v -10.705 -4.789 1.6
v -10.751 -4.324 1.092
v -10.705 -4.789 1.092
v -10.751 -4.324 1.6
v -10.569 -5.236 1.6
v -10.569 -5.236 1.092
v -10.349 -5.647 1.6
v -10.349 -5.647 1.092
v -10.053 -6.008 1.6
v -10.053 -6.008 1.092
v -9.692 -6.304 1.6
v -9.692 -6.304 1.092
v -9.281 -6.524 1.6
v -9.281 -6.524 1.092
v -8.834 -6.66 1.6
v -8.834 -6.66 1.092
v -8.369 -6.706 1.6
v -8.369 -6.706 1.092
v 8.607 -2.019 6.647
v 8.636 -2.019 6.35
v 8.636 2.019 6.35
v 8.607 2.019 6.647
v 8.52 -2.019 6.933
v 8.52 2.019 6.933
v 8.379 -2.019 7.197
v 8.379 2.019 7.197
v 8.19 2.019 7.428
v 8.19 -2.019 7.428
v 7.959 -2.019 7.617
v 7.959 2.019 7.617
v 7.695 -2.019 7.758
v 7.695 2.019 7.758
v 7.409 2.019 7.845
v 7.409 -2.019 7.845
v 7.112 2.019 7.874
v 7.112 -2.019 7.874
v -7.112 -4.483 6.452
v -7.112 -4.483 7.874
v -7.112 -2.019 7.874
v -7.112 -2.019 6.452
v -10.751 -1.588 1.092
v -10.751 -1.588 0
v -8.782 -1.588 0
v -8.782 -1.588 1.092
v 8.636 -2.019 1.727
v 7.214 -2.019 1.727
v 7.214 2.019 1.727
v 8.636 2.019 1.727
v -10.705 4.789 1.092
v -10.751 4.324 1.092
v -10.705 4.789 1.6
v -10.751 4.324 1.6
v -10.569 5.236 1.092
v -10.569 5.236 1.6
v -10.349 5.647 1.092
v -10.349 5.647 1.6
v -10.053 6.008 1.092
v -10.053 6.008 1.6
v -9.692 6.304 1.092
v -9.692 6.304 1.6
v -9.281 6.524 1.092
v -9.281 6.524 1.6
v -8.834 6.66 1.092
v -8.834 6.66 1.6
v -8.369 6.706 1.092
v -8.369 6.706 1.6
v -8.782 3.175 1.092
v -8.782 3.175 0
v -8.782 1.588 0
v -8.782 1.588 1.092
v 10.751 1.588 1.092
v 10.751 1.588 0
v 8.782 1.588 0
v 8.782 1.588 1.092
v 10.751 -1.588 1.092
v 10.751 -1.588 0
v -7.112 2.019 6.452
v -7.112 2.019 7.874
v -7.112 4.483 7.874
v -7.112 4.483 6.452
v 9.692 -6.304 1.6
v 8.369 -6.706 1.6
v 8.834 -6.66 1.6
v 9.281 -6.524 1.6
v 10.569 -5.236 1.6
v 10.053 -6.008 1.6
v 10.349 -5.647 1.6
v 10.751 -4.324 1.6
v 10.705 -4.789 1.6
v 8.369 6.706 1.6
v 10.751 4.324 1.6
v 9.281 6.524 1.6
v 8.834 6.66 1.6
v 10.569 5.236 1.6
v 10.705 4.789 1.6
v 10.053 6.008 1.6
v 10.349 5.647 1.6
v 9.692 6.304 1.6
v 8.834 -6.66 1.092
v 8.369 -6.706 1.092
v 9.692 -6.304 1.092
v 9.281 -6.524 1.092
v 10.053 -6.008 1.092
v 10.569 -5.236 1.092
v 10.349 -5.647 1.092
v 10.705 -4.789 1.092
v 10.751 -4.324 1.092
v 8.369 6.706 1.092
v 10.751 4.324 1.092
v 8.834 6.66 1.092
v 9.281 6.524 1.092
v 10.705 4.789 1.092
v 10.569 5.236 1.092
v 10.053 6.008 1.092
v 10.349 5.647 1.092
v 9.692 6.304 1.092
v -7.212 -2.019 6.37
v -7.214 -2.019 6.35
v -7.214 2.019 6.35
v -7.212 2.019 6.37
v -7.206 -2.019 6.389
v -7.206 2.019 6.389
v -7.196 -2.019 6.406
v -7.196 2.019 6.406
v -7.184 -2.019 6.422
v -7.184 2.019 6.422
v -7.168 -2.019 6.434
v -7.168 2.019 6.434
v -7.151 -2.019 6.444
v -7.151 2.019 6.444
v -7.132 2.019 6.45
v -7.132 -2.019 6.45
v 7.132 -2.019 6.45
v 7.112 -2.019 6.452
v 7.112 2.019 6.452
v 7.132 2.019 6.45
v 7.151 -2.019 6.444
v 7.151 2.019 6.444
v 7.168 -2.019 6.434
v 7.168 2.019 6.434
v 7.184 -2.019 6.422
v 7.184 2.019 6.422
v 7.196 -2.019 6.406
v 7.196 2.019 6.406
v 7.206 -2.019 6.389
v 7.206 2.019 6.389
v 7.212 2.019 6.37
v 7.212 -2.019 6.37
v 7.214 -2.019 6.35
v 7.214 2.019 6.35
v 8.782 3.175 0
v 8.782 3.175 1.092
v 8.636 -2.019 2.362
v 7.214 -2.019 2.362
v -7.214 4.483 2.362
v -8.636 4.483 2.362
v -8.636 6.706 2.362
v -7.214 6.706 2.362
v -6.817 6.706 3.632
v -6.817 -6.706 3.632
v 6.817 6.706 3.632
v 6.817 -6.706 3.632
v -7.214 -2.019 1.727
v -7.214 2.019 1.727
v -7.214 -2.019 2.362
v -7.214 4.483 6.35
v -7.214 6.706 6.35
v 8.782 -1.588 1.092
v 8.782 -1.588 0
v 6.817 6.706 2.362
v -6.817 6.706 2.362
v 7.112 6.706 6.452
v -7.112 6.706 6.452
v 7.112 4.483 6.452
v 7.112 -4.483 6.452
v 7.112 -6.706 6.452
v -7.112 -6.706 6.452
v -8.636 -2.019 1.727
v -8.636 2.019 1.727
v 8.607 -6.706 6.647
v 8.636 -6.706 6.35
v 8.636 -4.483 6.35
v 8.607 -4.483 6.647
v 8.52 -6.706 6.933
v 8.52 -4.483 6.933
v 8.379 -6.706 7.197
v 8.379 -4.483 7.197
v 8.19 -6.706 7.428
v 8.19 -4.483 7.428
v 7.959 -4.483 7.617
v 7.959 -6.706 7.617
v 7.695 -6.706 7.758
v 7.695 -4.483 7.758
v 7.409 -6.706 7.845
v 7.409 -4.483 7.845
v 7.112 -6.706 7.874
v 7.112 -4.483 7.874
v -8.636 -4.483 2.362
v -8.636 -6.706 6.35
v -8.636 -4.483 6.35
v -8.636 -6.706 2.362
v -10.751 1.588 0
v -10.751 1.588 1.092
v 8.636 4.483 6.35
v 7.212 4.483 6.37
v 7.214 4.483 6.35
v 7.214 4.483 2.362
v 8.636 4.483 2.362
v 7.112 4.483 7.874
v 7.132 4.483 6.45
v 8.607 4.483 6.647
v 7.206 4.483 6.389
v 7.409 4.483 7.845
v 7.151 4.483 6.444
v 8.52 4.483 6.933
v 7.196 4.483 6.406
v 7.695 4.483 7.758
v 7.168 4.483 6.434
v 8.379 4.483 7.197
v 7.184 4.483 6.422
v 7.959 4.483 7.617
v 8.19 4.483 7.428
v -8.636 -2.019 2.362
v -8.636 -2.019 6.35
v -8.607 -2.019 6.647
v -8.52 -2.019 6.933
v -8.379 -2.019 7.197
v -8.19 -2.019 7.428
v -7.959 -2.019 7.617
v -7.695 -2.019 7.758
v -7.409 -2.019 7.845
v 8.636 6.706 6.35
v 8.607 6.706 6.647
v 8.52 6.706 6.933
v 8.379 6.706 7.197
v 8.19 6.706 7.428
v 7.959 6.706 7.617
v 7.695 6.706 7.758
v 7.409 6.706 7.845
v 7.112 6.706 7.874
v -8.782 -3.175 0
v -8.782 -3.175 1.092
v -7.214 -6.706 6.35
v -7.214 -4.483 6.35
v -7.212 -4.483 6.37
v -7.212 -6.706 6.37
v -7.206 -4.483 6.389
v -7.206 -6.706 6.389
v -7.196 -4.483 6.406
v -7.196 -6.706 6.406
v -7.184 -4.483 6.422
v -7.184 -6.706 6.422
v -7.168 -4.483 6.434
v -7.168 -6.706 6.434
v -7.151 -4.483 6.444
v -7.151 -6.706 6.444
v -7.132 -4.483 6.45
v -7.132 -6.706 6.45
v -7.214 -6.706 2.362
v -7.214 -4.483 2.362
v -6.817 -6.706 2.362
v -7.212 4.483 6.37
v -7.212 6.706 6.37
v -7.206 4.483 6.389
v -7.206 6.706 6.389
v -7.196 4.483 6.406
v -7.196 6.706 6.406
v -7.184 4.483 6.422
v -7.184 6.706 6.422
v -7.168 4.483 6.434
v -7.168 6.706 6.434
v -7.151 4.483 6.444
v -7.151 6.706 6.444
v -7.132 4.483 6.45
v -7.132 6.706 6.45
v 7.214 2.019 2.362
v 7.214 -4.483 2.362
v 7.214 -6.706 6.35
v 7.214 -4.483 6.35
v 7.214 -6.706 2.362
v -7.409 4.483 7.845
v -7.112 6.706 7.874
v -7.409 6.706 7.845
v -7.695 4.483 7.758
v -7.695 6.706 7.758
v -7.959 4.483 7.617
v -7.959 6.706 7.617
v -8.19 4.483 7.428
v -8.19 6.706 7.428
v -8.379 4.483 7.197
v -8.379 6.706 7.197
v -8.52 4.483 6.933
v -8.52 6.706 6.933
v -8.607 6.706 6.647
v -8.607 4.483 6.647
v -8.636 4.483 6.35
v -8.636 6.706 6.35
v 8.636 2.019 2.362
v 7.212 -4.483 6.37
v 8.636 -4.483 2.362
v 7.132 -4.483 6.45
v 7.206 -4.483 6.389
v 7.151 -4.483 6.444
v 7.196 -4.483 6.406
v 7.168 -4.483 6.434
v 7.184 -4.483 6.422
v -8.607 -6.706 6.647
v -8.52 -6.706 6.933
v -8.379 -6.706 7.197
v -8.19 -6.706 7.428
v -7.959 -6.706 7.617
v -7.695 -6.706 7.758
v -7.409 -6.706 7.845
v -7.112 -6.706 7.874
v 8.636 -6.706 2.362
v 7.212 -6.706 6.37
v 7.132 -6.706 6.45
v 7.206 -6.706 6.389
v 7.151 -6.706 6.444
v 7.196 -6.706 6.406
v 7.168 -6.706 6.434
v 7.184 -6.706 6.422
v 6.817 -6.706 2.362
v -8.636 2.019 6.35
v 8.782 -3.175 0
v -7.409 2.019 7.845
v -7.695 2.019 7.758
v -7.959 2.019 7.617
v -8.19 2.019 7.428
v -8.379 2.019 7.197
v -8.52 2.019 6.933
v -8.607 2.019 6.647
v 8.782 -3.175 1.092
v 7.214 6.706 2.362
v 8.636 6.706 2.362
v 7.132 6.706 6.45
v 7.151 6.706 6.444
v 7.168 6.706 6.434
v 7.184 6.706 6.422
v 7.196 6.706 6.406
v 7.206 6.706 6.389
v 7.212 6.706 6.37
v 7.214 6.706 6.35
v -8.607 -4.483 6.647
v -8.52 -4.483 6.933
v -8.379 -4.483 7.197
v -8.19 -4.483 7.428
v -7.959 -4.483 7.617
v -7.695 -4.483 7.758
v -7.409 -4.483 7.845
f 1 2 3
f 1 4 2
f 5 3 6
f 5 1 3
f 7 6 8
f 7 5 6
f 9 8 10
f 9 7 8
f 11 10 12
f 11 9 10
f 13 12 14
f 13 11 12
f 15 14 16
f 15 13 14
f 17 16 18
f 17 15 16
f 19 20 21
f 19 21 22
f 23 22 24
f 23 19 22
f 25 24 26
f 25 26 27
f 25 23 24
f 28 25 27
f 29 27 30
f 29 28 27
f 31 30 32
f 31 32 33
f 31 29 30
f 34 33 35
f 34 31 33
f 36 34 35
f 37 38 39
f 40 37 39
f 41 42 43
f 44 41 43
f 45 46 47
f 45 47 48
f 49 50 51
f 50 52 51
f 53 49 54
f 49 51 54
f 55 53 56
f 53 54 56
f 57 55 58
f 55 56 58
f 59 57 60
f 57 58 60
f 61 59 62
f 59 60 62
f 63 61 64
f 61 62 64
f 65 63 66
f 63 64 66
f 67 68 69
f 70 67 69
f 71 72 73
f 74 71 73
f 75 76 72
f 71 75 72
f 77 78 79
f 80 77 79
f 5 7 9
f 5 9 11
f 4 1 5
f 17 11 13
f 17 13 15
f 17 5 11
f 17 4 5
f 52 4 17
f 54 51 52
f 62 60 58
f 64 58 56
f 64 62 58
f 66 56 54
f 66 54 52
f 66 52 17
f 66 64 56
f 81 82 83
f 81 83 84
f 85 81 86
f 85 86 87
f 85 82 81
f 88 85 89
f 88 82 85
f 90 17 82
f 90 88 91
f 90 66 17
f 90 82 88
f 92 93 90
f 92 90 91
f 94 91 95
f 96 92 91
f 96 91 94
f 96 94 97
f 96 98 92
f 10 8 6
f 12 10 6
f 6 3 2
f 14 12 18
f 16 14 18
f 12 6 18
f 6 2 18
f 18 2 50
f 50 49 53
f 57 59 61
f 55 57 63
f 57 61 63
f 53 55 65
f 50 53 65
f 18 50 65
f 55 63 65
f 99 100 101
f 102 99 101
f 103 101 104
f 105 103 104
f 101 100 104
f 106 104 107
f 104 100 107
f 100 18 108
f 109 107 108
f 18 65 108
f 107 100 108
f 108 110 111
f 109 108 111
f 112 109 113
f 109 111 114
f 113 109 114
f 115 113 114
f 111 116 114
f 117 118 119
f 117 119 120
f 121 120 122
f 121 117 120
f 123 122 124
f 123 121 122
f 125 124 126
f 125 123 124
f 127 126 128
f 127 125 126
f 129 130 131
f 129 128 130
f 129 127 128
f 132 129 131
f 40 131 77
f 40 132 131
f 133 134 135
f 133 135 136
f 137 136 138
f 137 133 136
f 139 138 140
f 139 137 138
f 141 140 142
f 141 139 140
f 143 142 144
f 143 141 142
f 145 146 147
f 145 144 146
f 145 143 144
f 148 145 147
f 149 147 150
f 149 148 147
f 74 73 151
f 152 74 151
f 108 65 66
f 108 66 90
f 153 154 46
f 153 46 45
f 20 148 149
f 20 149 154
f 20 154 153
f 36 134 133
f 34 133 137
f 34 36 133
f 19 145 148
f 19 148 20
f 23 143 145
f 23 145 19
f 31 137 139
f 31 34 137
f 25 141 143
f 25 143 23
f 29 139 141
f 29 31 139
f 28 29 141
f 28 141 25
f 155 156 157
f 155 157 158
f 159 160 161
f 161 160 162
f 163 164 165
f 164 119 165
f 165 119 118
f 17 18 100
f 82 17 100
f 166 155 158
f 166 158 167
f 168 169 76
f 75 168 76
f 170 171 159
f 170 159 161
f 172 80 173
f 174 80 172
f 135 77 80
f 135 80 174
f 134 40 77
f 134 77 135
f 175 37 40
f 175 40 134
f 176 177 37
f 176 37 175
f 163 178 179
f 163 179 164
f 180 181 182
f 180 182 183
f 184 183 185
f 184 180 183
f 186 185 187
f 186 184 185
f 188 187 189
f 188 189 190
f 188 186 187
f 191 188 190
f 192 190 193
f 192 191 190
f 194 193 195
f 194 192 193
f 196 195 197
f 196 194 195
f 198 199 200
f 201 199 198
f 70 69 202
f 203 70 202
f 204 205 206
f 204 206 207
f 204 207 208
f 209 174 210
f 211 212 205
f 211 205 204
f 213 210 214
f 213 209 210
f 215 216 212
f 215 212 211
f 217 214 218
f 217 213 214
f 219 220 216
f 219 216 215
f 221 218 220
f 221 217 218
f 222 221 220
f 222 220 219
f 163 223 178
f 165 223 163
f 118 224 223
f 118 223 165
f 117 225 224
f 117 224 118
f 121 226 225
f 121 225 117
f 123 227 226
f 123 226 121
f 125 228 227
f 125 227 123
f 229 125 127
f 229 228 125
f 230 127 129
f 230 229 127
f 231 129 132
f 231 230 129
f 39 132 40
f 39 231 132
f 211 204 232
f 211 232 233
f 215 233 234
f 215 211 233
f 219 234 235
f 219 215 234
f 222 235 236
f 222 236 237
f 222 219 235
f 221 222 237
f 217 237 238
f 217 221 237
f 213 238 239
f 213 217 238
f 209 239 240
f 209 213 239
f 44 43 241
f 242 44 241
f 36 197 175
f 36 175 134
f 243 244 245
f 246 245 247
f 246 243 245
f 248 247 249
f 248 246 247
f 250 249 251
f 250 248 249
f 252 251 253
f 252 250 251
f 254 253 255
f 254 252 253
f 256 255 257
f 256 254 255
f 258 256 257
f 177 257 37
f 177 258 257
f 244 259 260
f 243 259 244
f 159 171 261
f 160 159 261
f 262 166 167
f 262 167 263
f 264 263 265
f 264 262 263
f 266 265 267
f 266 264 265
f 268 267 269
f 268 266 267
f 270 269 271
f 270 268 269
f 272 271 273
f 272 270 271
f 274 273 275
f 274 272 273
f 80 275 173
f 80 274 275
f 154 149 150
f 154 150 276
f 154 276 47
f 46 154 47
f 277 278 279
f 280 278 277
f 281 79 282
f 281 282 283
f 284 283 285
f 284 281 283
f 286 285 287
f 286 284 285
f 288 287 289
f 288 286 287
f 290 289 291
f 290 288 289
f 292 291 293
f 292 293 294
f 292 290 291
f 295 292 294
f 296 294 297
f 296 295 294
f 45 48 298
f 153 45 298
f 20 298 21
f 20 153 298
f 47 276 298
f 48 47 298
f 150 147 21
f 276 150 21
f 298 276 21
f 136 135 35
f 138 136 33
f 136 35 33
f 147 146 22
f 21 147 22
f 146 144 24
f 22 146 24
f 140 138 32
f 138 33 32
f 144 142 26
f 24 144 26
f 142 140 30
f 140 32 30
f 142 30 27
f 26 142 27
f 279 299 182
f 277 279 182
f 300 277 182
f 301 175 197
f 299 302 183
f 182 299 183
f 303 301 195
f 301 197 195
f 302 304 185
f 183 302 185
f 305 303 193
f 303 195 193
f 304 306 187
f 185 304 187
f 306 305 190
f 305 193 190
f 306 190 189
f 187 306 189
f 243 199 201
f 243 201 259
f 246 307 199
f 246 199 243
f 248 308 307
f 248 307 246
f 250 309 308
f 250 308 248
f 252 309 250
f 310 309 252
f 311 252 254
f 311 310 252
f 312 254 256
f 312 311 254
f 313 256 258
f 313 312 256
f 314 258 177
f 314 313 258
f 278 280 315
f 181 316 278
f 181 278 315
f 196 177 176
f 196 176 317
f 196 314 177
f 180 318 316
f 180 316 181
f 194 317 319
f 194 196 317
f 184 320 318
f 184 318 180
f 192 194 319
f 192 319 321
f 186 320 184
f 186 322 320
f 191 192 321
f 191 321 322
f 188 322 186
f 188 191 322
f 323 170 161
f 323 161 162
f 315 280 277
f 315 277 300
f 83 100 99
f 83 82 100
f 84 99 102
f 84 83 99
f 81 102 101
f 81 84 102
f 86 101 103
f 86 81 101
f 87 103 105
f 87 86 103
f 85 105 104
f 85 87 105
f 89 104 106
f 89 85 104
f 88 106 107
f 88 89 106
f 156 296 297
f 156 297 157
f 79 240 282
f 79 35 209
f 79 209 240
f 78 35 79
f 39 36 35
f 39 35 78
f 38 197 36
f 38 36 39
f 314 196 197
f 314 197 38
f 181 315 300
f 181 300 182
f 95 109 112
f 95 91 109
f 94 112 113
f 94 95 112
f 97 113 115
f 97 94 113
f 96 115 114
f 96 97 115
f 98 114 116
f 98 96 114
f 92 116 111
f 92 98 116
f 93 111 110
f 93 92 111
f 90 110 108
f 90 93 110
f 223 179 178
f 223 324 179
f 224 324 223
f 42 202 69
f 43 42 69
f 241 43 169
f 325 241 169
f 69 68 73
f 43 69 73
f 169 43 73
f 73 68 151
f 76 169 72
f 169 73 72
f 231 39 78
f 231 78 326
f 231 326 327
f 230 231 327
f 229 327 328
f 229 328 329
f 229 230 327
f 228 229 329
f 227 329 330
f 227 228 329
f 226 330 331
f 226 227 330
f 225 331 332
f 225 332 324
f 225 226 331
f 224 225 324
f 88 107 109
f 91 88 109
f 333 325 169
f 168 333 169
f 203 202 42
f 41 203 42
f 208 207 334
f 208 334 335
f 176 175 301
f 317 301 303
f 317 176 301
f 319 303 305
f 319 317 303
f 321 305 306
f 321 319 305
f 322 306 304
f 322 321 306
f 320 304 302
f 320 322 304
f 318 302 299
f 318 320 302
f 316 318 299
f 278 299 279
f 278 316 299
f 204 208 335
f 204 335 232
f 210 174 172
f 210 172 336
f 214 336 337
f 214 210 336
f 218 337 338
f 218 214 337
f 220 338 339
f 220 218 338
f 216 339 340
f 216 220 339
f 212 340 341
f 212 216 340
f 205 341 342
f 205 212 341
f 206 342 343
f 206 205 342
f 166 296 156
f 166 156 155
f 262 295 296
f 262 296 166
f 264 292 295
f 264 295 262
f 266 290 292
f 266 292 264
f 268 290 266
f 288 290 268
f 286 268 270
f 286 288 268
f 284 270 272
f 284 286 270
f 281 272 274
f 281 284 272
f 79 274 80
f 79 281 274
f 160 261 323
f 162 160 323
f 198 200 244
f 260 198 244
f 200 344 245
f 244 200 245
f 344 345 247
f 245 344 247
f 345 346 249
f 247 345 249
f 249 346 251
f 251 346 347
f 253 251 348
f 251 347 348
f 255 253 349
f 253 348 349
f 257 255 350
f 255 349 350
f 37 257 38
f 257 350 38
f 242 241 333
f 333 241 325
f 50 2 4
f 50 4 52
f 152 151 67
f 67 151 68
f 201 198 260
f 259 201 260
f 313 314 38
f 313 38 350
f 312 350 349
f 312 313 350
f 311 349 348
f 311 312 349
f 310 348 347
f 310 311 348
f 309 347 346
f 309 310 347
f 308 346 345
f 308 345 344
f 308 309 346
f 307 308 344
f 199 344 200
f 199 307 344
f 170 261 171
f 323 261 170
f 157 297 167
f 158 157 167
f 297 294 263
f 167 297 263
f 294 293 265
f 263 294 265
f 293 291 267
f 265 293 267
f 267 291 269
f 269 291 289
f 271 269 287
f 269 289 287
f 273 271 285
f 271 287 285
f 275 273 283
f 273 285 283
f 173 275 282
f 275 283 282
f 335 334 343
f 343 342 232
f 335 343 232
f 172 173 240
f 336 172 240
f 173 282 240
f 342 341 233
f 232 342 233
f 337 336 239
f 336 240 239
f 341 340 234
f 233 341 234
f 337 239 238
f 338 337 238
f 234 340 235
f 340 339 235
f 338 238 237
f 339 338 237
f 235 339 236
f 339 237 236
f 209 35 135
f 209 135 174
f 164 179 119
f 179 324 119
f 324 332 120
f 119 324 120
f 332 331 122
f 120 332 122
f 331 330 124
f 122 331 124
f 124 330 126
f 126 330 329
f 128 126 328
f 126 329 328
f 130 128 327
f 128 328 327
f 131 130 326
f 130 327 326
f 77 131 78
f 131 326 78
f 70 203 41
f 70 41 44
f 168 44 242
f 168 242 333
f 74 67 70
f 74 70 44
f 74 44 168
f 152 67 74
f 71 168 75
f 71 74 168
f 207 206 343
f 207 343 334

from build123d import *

# Parameters (mm, degrees)
F1_DEPTH      = 1.0922
F2_W          = 21.5011
F2_H          = 13.4112
F3_DEPTH      = 0.508
F4_R          = 2.38125
F6_DEPTH      = 6.7056
F6_DEPTH_BACK = 6.7056
F7_W          = 13.63345
F7_H          = 13.4112
F8_DEPTH      = 1.27
F9_W          = 1.946656171
F9_H          = 2.4638
F10_DEPTH     = 7.875
F11_W         = 1.4224
F11_H         = 4.0386000008
F11_H_2       = 4.0386000007
F12_DEPTH     = 0.635


with BuildPart() as f1:
    # F0 (on Top) → F1 (new body)
    with BuildSketch(Plane.XY):
        Polygon((8.78205, 3.175), (0, 3.175), (-8.78205, 3.175), (-8.78205, 1.5875), (-10.75055, 1.5875), (-10.75055, 0), (-10.75055, -1.5875), (-8.78205, -1.5875), (-8.78205, -3.175), (0, -3.175), (8.78205, -3.175), (8.78205, -1.5875), (10.75055, -1.5875), (10.75055, 0), (10.75055, 1.5875), (8.78205, 1.5875), align=None)
    extrude(amount=F1_DEPTH)


with BuildPart() as f3:
    # F2 (on face) → F3 (new body)
    with BuildSketch(Plane.XY.offset(1.0922)):
        Rectangle(F2_W, F2_H)
    extrude(amount=F3_DEPTH)

    # F4
    f4_edges = [f3.edges().sort_by_distance(p)[0] for p in [
        (10.75055, -6.7056, 1.3462),
        (10.75055, 6.7056, 1.3462),
        (-10.75055, -6.7056, 1.3462),
        (-10.75055, 6.7056, 1.3462),
    ]]
    fillet(f4_edges, radius=F4_R)


with BuildPart() as f6:
    # F5 (on Front) → F6 (new body, two sides)
    with BuildSketch(Plane.XZ) as f6_sk:
        with BuildLine():
            Line((7.112, 7.874), (0, 7.874))
            Line((0, 7.874), (-7.112, 7.874))
            ThreePointArc((-7.112, 7.874), (-8.1896307345, 7.4276307345), (-8.636, 6.35))
            Line((-8.636, 6.35), (-8.636, 2.3622))
            Line((-8.636, 2.3622), (-7.2136, 2.3622))
            Line((-7.2136, 2.3622), (-7.2136, 6.35))
            ThreePointArc((-7.2136, 6.35), (-7.183842049, 6.421842049), (-7.112, 6.4516))
            Line((-7.112, 6.4516), (0, 6.4516))
            Line((0, 6.4516), (7.112, 6.4516))
            ThreePointArc((7.112, 6.4516), (7.183842049, 6.421842049), (7.2136, 6.35))
            Line((7.2136, 6.35), (7.2136, 2.3622))
            Line((7.2136, 2.3622), (8.636, 2.3622))
            Line((8.636, 2.3622), (8.636, 6.35))
            ThreePointArc((8.636, 6.35), (8.1896307345, 7.4276307345), (7.112, 7.874))
        make_face()
    extrude(amount=F6_DEPTH)
    extrude(f6_sk.sketch, amount=-F6_DEPTH_BACK)

    # F9 (on face) → F10 (cut, through all)
    with BuildSketch(Plane.XY.offset(7.874)):
        with Locations((-8.0853280855, 3.2512)):
            Rectangle(F9_W, F9_H)
        with Locations((-8.0853280855, -3.2512)):
            Rectangle(F9_W, F9_H)
        with Locations((8.0853280855, 3.2512)):
            Rectangle(F9_W, F9_H)
        with Locations((8.0853280855, -3.2512)):
            Rectangle(F9_W, F9_H)
    extrude(amount=-F10_DEPTH, mode=Mode.SUBTRACT)

    # F11 (on face) → F12 (join)
    with BuildSketch(Plane(origin=(0, 0, 2.3622), x_dir=(1, 0, 0), z_dir=(0, 0, -1))):
        with Locations((-7.9248, 4e-10)):
            Rectangle(F11_W, F11_H)
        with Locations((7.9248, 3e-10)):
            Rectangle(F11_W, F11_H_2)
    extrude(amount=F12_DEPTH)


with BuildPart() as f8:
    # F7 (on face) → F8 (new body)
    with BuildSketch(Plane(origin=(0, 0, 2.3622), x_dir=(1, 0, 0), z_dir=(0, 0, -1))):
        Rectangle(F7_W, F7_H)
    extrude(amount=-F8_DEPTH)


solid = Compound([f1.part, f3.part, f6.part, f8.part])
